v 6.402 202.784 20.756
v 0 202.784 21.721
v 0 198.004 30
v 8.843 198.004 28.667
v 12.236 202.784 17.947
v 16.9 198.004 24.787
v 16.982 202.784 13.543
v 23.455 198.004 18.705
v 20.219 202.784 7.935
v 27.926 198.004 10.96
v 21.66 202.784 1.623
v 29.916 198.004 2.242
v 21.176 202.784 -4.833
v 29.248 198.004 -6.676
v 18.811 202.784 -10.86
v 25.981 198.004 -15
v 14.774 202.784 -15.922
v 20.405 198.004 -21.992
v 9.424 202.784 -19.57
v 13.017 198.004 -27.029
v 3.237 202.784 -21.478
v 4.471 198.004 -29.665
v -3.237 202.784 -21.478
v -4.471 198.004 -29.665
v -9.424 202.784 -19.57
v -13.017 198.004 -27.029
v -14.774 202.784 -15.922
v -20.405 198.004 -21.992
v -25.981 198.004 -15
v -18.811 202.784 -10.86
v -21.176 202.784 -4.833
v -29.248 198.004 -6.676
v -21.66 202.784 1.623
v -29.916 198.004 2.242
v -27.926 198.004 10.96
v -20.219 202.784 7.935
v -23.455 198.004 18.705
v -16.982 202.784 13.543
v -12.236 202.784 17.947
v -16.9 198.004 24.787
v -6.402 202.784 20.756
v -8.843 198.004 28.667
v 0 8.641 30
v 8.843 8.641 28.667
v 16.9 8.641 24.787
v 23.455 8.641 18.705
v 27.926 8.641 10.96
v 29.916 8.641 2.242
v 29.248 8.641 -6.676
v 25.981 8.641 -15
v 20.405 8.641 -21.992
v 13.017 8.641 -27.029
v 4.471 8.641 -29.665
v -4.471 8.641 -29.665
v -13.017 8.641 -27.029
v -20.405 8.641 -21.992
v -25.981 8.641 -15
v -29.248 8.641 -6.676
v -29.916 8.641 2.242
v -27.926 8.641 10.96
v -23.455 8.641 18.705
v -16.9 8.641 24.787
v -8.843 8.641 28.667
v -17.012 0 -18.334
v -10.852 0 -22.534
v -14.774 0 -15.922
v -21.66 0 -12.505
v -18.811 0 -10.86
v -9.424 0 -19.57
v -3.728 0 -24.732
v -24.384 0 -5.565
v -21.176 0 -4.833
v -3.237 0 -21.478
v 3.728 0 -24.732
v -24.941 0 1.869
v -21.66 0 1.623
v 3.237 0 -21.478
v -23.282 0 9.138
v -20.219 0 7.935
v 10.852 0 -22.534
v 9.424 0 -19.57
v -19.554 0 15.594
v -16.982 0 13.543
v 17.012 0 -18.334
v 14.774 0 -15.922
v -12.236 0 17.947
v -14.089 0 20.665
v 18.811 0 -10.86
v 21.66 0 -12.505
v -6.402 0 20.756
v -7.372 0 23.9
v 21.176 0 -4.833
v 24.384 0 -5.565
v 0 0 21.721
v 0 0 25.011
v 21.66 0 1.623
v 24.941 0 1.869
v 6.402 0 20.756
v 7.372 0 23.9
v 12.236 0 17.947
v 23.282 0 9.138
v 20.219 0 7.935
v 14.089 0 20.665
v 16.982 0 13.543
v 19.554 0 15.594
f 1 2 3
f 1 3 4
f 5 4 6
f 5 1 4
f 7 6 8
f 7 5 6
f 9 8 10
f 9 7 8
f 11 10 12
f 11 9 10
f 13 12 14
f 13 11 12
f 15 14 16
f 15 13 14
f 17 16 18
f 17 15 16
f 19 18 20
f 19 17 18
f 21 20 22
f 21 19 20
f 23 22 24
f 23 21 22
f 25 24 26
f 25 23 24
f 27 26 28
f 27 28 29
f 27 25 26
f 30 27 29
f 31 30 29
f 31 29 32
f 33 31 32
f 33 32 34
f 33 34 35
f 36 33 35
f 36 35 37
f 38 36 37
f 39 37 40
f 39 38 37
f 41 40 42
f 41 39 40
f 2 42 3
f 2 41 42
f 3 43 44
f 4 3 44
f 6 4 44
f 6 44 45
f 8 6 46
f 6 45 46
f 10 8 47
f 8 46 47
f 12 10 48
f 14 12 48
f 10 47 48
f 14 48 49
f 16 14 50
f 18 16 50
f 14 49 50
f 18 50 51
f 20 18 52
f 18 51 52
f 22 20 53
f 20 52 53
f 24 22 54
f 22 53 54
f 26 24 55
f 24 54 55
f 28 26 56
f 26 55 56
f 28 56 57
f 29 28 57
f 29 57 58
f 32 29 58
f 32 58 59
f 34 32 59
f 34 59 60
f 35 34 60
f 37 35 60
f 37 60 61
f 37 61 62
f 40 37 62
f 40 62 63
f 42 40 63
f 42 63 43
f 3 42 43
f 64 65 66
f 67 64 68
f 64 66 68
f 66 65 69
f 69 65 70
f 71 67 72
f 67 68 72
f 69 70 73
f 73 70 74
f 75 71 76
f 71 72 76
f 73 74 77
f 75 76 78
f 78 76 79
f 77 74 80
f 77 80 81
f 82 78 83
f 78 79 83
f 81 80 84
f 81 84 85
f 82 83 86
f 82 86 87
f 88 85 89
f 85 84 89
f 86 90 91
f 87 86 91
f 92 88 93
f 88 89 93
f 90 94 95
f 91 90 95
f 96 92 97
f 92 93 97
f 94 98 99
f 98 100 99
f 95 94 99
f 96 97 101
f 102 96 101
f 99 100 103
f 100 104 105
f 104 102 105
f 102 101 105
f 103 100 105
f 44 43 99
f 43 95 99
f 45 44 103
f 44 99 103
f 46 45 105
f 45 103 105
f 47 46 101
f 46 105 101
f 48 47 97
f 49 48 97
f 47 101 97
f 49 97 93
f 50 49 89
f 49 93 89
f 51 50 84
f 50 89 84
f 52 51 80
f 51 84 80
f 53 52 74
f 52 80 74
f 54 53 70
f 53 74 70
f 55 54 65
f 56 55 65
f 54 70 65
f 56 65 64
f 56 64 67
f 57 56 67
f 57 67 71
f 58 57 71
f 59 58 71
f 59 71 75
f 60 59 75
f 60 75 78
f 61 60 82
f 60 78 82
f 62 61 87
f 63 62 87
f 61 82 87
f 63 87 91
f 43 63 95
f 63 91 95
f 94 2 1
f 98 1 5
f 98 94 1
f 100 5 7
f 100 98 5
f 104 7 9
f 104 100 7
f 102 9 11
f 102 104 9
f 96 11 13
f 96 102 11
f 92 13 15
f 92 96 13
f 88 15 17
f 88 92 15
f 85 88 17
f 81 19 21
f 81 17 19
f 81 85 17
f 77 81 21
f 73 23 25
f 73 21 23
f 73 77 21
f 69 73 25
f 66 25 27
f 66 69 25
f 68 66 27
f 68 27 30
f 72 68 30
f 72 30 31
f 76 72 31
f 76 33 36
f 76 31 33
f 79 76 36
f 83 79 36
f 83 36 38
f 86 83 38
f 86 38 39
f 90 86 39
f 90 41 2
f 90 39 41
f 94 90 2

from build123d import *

# Parameters (mm, degrees)
SKETCH1_R           = 30
BOSS_EXTRUDE1_DEPTH = 202.993196
SKETCH2_R           = 21.720790464
CUT_EXTRUDE1_DEPTH  = 208.379453231
CHAMFER1_SIZE       = 4.98909
CHAMFER1_SIZE_2     = 8.641358


with BuildPart() as part:
    # Sketch1 → Boss-Extrude1 (new body)
    with BuildSketch(Plane(origin=(0, 0, 0), x_dir=(1, 0, 0), z_dir=(0, 1, 0))):
        with Locations(Location((0, 0, 0), (0, 0, 270))):
            Circle(SKETCH1_R)
    extrude(amount=BOSS_EXTRUDE1_DEPTH)

    # Sketch2 → Cut-Extrude1 (cut, through all)
    with BuildSketch(Plane(origin=(0, 0, 0), x_dir=(1, 0, 0), z_dir=(0, 1, 0))):
        with Locations(Location((0, 0, 0), (0, 0, 270))):
            Circle(SKETCH2_R)
    extrude(amount=CUT_EXTRUDE1_DEPTH, mode=Mode.SUBTRACT)

    # Chamfer1
    # the kernel refuses this chamfer: 8.641358, 4.98909 mm, written as the material it takes off along each edge
    with BuildSketch(Plane(origin=(0, 202.993196, 0), x_dir=(0, 0, 1), z_dir=(-1, 0, 0))) as chamfer1_piece_1:
        Polygon((30, -CHAMFER1_SIZE), (30 - CHAMFER1_SIZE_2, 0), (30, 0), align=None)
    revolve(axis=Axis((0, 202.993196, 0), (0, 1, 0)), mode=Mode.SUBTRACT)
    with BuildSketch(Plane(origin=(0, 0, 0), x_dir=(0, 0, 1), z_dir=(-1, 0, 0))) as chamfer1_piece_2:
        Polygon((30, CHAMFER1_SIZE_2), (30 - CHAMFER1_SIZE, 0), (30, 0), align=None)
    revolve(axis=Axis((0, 0, 0), (0, 1, 0)), mode=Mode.SUBTRACT)


solid = part.part
